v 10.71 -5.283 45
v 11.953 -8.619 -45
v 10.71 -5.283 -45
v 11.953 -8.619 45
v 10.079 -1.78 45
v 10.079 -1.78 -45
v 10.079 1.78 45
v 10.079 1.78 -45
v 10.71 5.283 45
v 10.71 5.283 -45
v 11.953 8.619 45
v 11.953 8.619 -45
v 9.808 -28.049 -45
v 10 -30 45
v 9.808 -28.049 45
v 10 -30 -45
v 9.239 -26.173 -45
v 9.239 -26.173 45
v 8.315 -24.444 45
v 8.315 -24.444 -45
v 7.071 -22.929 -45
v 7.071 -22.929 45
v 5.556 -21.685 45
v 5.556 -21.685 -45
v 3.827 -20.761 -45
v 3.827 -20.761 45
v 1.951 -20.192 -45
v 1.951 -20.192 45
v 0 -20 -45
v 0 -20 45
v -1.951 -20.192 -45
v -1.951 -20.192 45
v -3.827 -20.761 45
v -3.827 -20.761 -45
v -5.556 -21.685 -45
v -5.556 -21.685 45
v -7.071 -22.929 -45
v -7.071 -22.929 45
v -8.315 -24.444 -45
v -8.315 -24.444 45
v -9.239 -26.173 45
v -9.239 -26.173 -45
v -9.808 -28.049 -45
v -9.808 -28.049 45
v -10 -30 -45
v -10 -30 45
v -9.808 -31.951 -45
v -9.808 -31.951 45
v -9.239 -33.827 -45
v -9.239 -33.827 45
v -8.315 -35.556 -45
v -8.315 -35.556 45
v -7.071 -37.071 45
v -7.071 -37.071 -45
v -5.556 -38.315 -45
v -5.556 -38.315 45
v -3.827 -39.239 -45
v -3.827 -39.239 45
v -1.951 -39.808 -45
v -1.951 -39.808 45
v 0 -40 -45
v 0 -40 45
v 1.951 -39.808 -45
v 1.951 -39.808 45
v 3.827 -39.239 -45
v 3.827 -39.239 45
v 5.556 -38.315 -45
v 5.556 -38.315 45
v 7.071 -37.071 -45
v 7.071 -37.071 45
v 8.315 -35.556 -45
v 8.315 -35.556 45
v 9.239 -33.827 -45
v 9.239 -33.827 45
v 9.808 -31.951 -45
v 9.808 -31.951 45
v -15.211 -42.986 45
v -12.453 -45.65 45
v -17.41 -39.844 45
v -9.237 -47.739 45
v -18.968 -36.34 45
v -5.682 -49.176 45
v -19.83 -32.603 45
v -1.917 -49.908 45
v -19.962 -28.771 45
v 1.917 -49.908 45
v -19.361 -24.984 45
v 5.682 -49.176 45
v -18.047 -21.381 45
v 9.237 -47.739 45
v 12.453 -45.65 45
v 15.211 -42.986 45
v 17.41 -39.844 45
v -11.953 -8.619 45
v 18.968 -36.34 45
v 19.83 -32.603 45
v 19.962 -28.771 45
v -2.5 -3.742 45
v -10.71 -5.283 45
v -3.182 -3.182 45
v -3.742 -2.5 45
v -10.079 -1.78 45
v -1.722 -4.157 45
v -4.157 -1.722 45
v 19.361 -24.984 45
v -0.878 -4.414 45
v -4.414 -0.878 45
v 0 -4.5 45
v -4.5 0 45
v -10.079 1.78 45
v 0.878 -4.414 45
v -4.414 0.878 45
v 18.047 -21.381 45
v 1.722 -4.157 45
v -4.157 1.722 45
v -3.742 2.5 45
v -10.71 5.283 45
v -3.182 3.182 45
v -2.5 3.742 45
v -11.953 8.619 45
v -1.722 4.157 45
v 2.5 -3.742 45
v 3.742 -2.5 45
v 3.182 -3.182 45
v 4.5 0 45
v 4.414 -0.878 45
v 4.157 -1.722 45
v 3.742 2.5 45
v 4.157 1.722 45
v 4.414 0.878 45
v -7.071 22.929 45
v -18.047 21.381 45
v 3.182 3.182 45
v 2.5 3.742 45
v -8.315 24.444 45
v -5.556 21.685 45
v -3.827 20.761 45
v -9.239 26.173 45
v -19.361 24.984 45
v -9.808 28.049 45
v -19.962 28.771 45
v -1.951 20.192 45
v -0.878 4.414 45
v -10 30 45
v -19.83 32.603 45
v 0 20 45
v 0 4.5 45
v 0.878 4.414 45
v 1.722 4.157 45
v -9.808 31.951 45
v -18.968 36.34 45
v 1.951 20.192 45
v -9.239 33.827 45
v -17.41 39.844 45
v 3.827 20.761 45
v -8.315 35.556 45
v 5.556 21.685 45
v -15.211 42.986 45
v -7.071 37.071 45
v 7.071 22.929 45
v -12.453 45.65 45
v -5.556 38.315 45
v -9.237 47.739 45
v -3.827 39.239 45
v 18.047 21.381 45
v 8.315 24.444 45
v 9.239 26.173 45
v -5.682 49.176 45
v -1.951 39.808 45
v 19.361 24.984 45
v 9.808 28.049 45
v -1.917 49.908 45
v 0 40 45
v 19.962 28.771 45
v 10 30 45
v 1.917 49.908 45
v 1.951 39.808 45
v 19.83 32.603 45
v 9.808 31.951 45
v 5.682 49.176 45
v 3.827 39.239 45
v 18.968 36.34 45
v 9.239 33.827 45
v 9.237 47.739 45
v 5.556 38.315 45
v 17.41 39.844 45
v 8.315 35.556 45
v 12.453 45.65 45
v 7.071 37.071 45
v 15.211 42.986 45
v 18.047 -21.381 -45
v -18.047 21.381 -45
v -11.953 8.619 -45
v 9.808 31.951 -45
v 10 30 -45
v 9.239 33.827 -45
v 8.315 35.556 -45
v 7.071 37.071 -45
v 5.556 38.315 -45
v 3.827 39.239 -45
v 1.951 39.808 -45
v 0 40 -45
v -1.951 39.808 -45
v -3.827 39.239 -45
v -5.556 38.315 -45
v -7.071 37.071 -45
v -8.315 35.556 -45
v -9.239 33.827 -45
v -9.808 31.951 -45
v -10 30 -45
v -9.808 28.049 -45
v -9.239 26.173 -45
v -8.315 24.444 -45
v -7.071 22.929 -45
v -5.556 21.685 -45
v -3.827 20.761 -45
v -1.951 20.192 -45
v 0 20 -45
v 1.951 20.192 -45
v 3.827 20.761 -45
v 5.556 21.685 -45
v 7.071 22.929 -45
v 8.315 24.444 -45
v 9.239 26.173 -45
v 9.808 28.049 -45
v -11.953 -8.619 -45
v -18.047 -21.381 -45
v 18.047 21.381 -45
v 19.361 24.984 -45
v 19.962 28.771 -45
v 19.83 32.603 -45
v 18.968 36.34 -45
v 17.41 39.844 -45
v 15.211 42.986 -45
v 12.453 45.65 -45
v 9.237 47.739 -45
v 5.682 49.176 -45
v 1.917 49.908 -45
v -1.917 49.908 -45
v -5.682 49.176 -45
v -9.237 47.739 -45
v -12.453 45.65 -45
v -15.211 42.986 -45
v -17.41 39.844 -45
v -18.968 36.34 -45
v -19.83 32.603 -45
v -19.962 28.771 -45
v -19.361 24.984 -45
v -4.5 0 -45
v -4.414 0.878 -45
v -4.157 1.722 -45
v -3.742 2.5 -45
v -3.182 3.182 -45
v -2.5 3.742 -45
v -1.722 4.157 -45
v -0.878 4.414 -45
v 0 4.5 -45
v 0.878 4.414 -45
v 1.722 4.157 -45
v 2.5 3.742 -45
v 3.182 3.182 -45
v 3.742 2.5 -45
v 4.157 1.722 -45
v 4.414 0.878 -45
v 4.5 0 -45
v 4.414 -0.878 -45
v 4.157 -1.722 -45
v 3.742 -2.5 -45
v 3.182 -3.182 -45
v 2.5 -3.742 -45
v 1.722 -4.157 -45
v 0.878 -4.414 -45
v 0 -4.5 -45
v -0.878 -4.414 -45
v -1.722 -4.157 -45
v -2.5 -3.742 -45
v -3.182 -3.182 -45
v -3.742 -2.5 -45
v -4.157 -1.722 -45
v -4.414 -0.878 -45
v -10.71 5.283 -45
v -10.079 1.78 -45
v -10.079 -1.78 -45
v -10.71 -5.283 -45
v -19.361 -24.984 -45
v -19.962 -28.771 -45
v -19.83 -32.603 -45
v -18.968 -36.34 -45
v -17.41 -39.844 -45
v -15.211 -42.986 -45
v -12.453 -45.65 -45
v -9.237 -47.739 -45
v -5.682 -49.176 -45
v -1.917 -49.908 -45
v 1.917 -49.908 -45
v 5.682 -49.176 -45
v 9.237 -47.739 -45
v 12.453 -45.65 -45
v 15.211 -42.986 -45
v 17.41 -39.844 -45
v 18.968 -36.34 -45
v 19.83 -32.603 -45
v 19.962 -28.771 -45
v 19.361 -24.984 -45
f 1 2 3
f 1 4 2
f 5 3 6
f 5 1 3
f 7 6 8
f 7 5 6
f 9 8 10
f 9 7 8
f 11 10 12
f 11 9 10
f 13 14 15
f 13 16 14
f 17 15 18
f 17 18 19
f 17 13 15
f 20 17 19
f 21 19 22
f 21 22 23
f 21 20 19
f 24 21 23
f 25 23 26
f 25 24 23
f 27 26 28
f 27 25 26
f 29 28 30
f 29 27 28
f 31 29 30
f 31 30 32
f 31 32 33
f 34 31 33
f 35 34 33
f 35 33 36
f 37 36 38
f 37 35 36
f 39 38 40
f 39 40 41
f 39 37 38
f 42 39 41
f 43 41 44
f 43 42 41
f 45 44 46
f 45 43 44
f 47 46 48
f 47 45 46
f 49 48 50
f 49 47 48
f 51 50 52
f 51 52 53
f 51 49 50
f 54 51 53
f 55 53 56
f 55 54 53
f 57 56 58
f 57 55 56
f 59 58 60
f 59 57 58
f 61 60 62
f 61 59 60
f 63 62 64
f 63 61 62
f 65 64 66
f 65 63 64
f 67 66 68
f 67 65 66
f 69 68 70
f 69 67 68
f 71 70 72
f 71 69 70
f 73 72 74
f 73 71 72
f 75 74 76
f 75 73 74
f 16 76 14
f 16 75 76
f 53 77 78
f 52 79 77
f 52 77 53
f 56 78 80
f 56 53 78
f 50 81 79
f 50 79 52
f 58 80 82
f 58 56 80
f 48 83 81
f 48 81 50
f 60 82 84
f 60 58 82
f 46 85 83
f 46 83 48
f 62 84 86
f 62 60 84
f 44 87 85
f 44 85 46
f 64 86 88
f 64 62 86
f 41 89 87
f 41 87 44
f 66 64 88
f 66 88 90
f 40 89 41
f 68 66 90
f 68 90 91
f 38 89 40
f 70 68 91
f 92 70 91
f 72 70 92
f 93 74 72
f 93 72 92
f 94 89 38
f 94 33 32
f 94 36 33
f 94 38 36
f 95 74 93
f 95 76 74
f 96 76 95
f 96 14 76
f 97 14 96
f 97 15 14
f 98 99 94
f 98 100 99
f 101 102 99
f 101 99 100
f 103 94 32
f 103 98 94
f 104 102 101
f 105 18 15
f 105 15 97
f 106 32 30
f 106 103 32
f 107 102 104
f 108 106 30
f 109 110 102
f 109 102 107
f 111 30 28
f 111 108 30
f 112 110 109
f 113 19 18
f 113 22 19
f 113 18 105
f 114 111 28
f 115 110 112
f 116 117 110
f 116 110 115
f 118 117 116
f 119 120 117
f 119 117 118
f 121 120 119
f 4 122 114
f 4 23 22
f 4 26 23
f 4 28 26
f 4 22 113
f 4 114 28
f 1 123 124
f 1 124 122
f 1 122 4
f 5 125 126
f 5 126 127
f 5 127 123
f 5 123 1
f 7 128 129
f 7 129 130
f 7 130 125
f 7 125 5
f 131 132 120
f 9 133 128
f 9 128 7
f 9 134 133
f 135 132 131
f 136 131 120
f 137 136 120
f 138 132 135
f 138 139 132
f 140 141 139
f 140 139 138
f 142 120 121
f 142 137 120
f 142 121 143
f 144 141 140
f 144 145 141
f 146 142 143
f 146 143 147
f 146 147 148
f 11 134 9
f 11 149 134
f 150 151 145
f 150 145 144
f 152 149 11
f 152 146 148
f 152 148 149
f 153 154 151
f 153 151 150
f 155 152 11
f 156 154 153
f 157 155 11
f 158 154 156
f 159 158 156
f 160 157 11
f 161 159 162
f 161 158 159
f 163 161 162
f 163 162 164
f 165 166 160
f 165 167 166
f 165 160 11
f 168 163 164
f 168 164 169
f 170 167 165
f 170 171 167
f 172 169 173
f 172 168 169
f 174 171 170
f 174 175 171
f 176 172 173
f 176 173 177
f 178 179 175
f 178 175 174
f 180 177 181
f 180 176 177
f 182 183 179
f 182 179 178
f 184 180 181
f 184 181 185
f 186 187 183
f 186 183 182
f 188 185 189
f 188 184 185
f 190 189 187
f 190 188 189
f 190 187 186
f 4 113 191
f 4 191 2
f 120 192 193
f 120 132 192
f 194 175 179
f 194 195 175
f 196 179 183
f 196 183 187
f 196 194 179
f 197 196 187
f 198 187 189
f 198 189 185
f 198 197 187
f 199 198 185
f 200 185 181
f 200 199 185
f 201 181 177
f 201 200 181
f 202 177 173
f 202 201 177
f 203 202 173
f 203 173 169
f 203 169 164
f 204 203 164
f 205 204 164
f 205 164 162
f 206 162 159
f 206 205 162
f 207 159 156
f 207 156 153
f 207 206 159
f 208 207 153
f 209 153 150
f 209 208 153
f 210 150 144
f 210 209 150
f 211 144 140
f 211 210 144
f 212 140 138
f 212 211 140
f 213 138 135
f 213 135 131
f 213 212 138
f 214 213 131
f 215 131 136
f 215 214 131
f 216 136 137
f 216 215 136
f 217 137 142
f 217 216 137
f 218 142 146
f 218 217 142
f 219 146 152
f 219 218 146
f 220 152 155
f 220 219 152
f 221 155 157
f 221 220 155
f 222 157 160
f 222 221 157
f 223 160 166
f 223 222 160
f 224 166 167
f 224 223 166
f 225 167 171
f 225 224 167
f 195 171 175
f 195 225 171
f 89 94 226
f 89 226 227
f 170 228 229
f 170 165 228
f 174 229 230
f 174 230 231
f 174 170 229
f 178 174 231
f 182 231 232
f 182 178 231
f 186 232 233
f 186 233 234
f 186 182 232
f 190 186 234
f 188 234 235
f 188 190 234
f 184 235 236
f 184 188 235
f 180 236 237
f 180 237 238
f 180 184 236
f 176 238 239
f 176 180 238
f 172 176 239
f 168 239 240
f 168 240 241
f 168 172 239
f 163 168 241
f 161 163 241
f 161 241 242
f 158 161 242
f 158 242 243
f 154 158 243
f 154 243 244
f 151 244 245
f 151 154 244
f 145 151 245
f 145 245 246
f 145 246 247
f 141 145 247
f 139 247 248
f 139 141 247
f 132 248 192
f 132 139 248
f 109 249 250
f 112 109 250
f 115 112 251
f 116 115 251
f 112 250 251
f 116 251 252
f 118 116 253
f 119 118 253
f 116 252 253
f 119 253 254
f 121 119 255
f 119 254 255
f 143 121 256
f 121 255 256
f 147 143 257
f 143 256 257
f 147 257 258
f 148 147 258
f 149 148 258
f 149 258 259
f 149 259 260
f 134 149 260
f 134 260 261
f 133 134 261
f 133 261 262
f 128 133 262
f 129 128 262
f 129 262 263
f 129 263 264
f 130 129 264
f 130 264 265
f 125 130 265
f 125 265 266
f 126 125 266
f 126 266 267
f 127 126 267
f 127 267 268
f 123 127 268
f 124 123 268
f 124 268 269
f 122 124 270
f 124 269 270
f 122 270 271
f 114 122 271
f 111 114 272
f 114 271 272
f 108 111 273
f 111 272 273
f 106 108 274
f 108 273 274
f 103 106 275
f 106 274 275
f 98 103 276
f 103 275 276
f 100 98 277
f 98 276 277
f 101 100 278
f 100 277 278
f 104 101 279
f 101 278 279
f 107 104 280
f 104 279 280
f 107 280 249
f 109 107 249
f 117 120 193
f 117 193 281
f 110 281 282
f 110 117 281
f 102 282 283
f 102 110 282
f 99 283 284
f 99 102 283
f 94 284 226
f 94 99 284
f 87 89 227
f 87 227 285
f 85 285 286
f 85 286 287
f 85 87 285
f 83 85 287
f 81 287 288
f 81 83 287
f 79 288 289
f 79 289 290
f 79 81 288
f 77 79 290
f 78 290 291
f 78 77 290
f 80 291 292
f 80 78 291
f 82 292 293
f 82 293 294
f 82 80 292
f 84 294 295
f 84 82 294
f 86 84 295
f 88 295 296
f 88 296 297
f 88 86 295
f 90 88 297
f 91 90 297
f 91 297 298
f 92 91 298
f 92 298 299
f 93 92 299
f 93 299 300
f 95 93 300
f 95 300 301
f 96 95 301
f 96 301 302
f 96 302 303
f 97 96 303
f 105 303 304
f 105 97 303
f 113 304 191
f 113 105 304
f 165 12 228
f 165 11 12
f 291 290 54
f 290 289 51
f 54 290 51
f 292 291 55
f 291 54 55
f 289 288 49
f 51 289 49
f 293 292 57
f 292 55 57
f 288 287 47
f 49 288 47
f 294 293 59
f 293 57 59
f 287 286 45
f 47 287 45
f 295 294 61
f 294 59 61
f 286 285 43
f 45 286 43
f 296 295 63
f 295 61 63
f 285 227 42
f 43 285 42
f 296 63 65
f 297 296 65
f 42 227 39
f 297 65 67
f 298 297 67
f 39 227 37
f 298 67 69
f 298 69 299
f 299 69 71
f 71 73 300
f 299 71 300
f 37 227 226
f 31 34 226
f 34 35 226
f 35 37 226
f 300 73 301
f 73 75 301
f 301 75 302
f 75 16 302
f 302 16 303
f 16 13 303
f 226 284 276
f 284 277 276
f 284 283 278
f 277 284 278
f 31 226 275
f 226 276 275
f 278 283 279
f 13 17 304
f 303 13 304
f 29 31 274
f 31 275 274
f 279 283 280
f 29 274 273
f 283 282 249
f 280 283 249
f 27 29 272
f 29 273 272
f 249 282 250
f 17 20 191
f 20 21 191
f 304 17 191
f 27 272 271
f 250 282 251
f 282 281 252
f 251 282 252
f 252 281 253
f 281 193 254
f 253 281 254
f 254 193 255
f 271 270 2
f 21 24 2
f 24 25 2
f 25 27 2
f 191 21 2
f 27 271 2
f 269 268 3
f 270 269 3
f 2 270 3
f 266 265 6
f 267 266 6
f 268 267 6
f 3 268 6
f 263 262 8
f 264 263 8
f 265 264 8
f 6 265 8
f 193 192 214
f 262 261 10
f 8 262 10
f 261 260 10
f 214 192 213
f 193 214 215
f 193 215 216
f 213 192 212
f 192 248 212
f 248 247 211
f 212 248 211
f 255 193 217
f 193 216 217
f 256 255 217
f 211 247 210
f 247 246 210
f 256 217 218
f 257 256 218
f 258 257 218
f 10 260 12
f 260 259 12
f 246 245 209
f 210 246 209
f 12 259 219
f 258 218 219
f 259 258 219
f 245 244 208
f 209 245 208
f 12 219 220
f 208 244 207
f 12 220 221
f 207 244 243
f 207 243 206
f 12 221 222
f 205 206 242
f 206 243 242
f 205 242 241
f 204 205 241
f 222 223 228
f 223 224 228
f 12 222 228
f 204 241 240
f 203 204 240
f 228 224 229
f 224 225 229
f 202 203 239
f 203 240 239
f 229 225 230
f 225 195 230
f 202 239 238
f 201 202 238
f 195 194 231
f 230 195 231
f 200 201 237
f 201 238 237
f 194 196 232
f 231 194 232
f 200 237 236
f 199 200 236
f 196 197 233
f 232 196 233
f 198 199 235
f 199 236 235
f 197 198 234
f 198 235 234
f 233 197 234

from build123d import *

# Parameters (mm, degrees)
SKETCH1_R              = 10
BOSS_EXTRUDE1_DEPTH    = 45
M10X1_0_TAPPED_HOLE1_D = 9


with BuildPart() as part:
    # Sketch1 → Boss-Extrude1 (new body, symmetric)
    with BuildSketch(Plane.XY):
        with BuildLine():
            Line((-18.047378541, 21.380711875), (-11.952621459, 8.619288125))
            ThreePointArc((-11.952621459, 8.619288125), (-10, 0), (-11.952621459, -8.619288125))
            Line((-11.952621459, -8.619288125), (-18.047378541, -21.380711875))
            ThreePointArc((-18.047378541, -21.380711875), (0, -50), (18.047378541, -21.380711875))
            Line((18.047378541, -21.380711875), (11.952621459, -8.619288125))
            ThreePointArc((11.952621459, -8.619288125), (10, 0), (11.952621459, 8.619288125))
            Line((11.952621459, 8.619288125), (18.047378541, 21.380711875))
            ThreePointArc((18.047378541, 21.380711875), (0, 50), (-18.047378541, 21.380711875))
        make_face()
        with Locations((0, 30)):
            Circle(SKETCH1_R, mode=Mode.SUBTRACT)
        with Locations((0, -30)):
            Circle(SKETCH1_R, mode=Mode.SUBTRACT)
    extrude(amount=BOSS_EXTRUDE1_DEPTH, both=True)

    # M10x1.0 Tapped Hole1 (through all)
    with Locations(Plane.XY.offset(45)):
        with Locations((0, 0)):
            Hole(M10X1_0_TAPPED_HOLE1_D / 2)


solid = part.part
